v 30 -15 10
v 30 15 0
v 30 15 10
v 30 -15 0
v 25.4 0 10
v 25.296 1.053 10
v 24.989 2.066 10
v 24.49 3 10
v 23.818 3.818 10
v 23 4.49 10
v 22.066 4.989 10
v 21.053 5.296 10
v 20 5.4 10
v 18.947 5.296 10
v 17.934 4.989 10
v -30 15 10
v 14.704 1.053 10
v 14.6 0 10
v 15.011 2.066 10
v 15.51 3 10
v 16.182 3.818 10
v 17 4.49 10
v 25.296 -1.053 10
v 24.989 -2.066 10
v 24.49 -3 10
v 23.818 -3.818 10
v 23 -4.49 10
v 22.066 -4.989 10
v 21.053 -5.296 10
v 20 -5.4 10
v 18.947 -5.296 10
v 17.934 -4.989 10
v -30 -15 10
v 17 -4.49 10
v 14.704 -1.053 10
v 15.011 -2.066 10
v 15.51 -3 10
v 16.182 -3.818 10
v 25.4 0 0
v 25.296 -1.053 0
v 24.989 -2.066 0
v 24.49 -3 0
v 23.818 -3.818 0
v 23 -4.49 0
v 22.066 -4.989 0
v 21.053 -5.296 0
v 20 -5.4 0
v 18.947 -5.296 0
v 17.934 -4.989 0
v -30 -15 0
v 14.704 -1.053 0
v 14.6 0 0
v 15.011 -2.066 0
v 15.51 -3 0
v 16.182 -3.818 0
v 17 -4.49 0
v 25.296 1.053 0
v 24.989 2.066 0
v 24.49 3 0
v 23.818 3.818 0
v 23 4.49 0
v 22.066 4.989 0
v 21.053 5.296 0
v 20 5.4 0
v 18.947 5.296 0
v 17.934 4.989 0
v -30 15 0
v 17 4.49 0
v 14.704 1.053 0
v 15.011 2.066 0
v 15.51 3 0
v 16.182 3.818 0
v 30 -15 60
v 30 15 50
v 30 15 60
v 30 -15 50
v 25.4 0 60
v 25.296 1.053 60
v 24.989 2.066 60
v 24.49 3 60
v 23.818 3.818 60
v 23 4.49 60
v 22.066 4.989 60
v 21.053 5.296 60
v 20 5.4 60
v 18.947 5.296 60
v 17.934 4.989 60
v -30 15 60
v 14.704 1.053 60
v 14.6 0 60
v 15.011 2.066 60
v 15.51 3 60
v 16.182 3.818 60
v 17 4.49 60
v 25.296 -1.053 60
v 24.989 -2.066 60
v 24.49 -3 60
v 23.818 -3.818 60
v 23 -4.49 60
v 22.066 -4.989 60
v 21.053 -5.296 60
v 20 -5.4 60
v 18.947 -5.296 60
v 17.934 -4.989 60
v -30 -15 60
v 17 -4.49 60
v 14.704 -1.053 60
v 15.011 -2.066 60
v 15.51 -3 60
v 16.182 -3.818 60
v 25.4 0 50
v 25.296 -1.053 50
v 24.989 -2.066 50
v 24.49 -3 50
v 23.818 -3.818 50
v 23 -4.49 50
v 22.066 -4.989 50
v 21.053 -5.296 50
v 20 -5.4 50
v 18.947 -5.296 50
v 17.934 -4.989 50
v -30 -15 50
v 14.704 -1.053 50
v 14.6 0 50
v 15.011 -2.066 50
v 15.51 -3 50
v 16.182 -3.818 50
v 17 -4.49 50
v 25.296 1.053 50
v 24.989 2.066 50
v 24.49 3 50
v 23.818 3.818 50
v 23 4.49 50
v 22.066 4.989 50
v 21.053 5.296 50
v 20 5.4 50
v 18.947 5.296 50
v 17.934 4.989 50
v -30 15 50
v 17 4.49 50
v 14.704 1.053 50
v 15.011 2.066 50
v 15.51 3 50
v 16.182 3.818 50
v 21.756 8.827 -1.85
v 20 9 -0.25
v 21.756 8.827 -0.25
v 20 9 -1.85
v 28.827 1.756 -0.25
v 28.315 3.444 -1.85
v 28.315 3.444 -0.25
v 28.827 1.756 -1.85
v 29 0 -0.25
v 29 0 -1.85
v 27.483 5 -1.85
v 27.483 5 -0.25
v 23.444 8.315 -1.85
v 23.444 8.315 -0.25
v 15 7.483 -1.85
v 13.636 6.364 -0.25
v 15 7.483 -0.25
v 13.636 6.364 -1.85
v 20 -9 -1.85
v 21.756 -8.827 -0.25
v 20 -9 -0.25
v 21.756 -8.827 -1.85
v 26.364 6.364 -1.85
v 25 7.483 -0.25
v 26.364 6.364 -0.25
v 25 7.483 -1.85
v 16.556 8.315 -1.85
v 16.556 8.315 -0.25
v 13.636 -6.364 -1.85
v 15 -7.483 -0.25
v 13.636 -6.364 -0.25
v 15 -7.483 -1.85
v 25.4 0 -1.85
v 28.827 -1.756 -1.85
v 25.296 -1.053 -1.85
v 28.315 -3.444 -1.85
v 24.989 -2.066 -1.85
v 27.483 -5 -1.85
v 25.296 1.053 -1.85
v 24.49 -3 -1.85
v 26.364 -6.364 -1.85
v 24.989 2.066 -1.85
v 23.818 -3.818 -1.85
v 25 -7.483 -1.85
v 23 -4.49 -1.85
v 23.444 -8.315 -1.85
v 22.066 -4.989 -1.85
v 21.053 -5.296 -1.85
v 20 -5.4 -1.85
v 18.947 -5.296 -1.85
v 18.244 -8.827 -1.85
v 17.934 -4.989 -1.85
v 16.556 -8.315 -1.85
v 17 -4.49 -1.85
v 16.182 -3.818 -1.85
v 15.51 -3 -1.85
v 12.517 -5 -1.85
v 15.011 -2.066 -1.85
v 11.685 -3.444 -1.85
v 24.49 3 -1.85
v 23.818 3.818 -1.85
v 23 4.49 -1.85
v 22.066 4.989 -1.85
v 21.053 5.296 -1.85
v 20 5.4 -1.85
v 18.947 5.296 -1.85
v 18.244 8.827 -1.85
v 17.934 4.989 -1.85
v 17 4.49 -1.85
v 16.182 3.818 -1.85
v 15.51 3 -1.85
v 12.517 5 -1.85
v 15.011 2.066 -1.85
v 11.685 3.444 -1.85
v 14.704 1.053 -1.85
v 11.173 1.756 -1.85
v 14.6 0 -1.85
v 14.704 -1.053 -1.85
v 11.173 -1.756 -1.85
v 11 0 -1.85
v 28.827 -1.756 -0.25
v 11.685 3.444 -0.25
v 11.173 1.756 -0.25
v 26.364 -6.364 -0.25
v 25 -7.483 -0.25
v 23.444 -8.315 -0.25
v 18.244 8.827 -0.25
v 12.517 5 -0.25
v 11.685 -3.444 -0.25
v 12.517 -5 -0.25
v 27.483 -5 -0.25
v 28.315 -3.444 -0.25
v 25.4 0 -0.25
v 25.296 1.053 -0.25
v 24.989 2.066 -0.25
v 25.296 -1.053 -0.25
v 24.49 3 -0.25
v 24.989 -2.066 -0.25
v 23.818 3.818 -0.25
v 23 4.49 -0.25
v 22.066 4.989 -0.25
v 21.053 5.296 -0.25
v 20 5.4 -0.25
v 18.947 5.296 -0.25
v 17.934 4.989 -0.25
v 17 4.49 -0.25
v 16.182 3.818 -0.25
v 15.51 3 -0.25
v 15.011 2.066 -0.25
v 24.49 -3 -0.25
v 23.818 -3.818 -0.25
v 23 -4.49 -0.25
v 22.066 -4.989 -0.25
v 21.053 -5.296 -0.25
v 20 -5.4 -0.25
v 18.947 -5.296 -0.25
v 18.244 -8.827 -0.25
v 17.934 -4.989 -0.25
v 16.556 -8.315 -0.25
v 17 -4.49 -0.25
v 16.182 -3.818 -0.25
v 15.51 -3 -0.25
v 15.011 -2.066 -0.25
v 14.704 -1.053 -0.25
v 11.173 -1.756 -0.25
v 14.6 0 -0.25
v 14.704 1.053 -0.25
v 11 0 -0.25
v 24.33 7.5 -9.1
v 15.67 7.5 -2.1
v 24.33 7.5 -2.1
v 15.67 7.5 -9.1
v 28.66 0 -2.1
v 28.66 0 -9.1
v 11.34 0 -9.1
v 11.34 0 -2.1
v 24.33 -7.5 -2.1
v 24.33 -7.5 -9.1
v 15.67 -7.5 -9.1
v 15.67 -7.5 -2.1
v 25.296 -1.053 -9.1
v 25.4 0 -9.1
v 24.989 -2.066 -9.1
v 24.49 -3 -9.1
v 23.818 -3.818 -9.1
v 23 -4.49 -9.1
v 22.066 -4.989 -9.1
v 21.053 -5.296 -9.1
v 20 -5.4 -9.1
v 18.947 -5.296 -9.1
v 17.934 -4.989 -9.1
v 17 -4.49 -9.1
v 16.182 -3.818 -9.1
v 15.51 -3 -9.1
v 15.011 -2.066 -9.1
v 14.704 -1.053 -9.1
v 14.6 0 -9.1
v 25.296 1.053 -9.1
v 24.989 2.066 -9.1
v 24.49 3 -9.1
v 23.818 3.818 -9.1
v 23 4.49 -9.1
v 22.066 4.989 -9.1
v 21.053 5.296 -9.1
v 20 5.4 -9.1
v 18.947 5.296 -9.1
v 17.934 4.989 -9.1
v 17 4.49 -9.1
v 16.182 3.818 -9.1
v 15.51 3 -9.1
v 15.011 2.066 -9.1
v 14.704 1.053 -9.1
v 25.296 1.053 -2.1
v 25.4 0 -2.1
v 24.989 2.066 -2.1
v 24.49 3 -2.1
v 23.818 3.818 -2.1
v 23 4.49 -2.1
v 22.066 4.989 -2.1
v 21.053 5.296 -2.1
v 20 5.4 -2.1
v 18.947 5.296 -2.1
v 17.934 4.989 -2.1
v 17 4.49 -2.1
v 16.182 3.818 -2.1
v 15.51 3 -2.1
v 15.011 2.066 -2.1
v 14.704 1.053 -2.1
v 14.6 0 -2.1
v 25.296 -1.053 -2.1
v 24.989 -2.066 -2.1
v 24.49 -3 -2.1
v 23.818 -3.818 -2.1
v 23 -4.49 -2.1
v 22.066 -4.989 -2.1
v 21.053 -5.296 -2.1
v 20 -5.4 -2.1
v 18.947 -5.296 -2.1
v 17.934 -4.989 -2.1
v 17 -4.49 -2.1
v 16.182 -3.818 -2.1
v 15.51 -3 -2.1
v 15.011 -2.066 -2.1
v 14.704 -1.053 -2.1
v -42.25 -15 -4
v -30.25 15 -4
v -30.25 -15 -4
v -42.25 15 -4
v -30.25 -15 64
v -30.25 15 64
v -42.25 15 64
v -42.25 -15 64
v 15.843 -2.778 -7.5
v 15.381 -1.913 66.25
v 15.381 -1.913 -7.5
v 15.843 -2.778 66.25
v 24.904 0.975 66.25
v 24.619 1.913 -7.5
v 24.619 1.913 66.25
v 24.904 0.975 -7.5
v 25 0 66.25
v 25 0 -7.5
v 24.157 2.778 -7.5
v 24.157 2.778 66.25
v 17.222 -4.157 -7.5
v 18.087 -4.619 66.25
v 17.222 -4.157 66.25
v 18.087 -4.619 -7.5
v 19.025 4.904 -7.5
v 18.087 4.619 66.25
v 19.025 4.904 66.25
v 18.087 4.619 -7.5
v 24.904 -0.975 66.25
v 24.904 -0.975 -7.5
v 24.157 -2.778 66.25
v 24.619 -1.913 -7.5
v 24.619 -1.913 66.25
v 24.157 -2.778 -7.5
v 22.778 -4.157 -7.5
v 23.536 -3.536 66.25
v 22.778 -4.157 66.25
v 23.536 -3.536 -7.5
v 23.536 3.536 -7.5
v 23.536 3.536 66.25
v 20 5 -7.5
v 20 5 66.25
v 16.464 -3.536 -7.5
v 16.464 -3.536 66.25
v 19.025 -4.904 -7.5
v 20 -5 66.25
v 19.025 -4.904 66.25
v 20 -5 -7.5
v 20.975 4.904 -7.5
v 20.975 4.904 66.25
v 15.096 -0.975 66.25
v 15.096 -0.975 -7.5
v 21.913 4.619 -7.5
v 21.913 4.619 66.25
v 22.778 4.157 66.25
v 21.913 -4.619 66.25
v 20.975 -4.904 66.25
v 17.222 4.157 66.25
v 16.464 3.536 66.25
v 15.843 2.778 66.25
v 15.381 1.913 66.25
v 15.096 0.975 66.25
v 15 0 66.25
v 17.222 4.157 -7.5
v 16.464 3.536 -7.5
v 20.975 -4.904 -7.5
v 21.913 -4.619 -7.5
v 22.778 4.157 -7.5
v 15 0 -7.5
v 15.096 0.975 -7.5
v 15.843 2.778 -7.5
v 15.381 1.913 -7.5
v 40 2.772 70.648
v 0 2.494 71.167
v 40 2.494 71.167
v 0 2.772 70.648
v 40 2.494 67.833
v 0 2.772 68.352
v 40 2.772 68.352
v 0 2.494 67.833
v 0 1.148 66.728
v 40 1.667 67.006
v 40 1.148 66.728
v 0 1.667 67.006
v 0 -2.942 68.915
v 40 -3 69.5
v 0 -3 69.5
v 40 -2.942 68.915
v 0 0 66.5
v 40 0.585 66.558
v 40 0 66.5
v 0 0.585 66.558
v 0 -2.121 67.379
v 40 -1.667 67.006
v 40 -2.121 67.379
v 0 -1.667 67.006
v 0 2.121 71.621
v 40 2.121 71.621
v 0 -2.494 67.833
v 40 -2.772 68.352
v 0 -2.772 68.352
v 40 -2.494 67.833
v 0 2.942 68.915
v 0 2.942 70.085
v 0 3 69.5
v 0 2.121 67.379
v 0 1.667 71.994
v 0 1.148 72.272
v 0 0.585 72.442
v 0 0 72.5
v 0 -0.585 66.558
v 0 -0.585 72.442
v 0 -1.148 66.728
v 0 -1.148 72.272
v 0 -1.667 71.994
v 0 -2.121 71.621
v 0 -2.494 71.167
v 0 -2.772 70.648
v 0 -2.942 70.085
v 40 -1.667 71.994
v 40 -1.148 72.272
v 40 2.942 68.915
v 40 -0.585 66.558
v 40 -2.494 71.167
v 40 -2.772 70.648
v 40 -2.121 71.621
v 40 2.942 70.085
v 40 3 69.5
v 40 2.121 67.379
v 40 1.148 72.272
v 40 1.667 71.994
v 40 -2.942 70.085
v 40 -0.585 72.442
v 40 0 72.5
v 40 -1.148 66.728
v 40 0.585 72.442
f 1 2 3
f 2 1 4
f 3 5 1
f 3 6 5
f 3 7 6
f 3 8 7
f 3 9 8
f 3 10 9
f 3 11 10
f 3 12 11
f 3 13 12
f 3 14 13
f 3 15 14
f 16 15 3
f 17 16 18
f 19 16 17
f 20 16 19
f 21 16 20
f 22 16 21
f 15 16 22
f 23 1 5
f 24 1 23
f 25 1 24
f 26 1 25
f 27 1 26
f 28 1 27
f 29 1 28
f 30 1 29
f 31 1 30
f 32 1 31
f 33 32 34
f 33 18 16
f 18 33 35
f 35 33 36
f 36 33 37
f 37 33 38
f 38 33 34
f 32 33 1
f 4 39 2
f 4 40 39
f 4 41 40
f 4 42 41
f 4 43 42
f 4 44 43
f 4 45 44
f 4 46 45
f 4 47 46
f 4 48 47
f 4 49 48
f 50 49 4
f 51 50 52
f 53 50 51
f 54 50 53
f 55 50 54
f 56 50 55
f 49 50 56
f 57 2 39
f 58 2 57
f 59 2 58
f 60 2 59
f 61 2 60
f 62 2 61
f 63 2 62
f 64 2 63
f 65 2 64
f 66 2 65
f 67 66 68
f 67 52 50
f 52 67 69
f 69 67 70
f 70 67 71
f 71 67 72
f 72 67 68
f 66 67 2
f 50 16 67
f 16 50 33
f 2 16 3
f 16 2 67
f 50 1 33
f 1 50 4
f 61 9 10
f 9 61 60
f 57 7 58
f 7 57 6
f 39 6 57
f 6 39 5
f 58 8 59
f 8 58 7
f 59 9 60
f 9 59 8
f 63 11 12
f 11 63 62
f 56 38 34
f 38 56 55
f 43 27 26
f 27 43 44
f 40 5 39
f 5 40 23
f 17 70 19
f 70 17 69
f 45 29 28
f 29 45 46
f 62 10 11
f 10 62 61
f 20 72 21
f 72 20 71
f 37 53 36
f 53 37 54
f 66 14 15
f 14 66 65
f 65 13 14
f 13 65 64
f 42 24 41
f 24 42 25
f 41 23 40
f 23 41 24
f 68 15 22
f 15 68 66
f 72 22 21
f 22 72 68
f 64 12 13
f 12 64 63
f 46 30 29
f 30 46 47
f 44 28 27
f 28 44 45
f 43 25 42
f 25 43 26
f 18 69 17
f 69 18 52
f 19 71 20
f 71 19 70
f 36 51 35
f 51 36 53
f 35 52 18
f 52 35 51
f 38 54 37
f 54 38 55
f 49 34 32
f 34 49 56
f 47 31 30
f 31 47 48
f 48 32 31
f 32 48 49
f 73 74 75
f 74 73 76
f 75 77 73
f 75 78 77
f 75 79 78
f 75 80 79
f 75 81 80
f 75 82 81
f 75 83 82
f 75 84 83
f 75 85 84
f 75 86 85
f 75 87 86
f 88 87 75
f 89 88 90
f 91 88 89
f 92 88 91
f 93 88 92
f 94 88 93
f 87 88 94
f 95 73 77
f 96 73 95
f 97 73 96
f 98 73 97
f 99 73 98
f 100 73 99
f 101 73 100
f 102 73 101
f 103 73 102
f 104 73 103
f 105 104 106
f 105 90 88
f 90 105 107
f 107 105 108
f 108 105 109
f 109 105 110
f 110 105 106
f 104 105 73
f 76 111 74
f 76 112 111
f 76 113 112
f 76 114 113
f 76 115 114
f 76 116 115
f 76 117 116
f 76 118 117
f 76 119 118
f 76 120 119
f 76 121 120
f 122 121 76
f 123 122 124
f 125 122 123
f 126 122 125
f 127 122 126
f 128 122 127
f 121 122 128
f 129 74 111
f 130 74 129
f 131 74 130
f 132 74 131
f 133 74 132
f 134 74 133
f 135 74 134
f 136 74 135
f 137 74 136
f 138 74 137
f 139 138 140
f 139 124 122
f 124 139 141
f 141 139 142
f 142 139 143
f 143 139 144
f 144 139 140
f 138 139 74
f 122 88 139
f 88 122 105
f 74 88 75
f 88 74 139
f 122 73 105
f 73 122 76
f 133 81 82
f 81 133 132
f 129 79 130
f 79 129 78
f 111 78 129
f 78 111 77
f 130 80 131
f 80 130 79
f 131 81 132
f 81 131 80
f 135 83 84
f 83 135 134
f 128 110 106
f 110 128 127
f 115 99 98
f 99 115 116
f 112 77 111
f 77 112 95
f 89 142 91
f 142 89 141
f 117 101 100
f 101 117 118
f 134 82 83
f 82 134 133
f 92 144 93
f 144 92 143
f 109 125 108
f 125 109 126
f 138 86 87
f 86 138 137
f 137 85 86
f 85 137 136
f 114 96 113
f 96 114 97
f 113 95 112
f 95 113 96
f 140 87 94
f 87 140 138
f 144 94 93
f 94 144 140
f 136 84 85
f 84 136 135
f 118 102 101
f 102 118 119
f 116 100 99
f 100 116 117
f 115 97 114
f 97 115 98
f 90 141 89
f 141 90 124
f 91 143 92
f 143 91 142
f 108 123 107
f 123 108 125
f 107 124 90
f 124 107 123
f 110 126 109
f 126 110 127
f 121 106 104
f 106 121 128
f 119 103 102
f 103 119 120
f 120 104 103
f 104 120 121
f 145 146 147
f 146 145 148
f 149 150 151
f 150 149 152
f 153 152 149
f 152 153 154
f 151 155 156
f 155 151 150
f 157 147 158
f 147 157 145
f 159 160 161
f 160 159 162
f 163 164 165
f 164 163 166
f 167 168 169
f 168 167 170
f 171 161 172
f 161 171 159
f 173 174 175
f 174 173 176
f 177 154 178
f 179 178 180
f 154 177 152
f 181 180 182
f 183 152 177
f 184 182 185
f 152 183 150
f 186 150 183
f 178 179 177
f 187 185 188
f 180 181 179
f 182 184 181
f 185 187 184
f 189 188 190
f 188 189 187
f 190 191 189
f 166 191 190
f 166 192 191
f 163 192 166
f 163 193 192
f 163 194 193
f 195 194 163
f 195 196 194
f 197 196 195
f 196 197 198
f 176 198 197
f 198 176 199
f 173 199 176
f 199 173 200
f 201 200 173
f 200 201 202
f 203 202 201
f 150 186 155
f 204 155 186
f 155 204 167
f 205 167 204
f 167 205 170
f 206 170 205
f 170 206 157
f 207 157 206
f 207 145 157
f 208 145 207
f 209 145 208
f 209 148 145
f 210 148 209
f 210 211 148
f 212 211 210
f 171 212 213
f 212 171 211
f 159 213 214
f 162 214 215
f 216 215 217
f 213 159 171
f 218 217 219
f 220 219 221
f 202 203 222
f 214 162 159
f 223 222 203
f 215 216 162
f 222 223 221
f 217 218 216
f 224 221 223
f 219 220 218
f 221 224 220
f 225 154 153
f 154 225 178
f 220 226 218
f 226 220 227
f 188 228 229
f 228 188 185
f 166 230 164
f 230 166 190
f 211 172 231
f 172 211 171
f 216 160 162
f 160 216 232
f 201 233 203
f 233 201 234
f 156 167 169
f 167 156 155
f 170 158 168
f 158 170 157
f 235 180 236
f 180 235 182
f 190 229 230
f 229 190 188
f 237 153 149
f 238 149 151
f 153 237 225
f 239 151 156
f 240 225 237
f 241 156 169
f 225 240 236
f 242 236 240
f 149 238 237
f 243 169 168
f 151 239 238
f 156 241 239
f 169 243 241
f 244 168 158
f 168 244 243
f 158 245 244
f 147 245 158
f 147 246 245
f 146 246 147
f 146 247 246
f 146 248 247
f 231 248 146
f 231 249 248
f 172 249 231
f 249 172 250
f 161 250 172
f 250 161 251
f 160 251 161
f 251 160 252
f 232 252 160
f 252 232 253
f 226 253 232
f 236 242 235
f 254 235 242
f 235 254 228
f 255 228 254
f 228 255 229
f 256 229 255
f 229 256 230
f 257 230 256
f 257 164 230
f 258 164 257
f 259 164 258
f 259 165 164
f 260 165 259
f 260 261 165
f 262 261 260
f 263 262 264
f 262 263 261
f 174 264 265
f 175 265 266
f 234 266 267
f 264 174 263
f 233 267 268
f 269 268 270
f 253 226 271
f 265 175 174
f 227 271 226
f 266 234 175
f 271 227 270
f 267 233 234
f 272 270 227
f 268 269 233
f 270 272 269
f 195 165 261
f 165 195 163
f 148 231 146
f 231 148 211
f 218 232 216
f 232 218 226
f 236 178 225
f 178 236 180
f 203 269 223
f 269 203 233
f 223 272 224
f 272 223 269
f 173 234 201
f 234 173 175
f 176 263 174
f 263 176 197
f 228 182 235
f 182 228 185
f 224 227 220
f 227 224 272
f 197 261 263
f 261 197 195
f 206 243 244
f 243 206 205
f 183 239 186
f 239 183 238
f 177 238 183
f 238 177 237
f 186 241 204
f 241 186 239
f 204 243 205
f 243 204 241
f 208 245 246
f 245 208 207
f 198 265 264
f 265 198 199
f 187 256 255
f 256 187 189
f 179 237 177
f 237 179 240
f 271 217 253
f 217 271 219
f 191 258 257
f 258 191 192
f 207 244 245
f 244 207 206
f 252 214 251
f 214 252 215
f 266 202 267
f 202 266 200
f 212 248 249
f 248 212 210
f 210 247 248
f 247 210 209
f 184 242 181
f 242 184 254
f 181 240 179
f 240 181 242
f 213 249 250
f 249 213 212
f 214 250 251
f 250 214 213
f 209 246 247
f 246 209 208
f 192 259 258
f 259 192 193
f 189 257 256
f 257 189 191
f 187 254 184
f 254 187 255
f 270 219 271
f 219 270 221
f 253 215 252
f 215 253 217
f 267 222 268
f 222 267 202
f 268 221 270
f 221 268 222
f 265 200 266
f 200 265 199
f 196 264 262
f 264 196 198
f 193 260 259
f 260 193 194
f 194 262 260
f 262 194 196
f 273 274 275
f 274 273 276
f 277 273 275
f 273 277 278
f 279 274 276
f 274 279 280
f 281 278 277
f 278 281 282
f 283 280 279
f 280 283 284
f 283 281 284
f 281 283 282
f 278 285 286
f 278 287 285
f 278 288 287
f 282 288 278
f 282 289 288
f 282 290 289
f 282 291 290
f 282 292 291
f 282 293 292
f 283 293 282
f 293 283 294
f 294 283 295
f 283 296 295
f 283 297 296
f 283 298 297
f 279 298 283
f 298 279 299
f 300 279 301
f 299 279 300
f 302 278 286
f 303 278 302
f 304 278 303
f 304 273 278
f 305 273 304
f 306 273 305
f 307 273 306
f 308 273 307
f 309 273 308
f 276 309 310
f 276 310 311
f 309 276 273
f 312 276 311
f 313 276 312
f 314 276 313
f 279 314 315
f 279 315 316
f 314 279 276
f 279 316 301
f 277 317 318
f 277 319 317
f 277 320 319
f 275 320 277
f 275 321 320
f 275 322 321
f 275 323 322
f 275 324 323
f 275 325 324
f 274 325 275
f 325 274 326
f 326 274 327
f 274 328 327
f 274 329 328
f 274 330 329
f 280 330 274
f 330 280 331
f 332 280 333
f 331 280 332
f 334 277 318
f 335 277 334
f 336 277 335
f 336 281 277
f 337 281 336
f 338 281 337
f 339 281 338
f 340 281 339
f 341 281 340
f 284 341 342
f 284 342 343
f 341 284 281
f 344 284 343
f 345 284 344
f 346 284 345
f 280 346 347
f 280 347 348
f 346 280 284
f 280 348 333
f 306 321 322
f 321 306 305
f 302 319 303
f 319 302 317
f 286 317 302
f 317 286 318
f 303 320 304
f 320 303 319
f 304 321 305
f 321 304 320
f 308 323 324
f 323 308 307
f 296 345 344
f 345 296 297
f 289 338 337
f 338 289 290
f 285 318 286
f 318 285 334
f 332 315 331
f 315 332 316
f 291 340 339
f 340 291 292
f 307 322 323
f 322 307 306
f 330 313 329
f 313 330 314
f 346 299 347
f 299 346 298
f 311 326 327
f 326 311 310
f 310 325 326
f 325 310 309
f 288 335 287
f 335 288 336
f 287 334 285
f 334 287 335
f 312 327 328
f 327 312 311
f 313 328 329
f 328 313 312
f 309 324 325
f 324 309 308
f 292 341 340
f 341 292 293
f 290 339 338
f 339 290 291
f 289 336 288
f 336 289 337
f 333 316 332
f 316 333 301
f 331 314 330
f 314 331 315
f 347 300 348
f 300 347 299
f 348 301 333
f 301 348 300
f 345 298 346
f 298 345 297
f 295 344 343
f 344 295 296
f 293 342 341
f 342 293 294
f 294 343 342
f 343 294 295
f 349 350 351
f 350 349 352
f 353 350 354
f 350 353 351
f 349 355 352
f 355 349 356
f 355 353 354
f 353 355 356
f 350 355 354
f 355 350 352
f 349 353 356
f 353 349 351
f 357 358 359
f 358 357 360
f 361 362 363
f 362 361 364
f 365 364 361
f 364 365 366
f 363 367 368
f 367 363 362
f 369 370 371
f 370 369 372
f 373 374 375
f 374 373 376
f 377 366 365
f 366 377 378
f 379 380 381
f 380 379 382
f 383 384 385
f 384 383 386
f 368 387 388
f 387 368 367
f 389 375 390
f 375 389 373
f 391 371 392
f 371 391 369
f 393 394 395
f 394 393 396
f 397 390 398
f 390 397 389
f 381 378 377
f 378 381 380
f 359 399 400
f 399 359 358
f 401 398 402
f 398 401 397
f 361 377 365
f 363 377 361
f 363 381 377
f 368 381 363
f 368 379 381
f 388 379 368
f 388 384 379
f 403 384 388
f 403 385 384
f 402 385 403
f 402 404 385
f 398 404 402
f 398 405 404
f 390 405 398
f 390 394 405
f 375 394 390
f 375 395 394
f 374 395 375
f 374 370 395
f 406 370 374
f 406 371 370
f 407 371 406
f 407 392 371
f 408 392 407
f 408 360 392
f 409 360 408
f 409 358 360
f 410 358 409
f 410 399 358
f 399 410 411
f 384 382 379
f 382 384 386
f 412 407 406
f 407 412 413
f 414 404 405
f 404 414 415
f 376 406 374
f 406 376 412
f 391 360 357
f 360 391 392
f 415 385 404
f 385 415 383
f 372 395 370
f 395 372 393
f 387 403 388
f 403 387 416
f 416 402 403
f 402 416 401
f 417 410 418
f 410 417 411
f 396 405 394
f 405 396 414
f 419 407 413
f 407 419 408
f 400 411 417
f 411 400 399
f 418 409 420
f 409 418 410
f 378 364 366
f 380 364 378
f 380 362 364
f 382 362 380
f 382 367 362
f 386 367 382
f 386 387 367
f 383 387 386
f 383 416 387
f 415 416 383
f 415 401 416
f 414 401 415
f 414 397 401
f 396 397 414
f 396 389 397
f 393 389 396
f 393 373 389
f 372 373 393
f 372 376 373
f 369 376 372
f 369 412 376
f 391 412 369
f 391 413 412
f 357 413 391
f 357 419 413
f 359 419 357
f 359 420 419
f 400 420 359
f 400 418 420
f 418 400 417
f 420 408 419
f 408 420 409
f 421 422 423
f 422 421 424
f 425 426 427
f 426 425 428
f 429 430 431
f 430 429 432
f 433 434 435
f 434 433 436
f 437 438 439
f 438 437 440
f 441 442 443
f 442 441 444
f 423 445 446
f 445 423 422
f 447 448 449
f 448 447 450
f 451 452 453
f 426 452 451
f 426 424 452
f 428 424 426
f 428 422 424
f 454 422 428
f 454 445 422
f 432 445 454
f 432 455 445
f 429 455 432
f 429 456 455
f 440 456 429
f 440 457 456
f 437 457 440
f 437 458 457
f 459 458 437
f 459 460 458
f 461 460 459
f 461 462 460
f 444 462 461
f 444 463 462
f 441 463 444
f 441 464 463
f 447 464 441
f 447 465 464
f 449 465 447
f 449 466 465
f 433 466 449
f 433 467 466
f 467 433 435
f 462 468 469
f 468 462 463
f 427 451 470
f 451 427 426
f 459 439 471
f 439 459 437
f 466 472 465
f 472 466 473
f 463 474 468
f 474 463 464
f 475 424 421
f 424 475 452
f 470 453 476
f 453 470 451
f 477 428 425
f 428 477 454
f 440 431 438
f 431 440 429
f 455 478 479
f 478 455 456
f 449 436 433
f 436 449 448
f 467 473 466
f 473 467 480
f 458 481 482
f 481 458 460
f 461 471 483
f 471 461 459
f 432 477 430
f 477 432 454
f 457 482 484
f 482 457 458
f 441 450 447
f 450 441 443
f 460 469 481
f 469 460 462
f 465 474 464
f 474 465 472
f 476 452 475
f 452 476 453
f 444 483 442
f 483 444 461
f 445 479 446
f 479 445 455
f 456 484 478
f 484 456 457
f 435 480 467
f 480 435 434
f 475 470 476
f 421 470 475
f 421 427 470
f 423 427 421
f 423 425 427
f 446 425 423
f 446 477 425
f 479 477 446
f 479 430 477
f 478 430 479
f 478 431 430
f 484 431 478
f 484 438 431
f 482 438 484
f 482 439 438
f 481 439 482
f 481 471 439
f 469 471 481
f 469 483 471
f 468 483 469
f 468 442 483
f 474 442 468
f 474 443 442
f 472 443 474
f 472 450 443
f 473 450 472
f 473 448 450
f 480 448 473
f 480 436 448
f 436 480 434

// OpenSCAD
$fn = 32;

// ------------------------------------------------------------------------
// C clamp: throat 50 mm, screw d10
// Every part is its own module, assembly() places every instance.
// ------------------------------------------------------------------------

// --- part 1 ---
module clamp_arm() {
  difference() {
    translate([-30, -15, 0]) cube([60, 30, 10]);
    translate([20, 0, -1]) cylinder(h = 12, d = 10.8);
  }
}

// --- part 2 ---
module clamp_spine() {
  difference() {
    translate([-34, -15, 0]) cube([68, 30, 12]);
  }
}

// --- part 3 ---
module clamp_screw() {
  translate([0, 0, -36.875]) cylinder(h = 73.75, d = 10);
}

// --- part 4 ---
module clamp_washer() {
  difference() {
      translate([0, 0, 0]) cylinder(h = 1.6, d = 18);
      translate([0, 0, -1]) cylinder(h = 3.6, d = 10.8);
    }
}

// --- part 5 ---
module clamp_nut() {
  difference() {
    linear_extrude(height = 7) polygon(points = [[8.66, 0], [4.33, 7.5], [-4.33, 7.5], [-8.66, 0], [-4.33, -7.5], [4.33, -7.5]]);
    translate([0, 0, -1]) cylinder(h = 9, d = 10.8);
  }
}

// --- part 6 ---
module tommy_bar() {
  translate([0, 0, -20]) cylinder(h = 40, d = 6);
}

// --- assembly ---
module assembly() {
  color([0.80, 0.24, 0.20]) translate([0, 0, 0]) rotate([0, 0, 0]) clamp_arm();
  color([0.20, 0.45, 0.75]) translate([0, 0, 50]) rotate([0, 0, 0]) clamp_arm();
  color([0.25, 0.62, 0.32]) translate([-42.25, 0, 30]) rotate([0, 90, 0]) clamp_spine();
  color([0.92, 0.70, 0.18]) translate([20, 0, 29.375]) rotate([0, 0, 0]) clamp_screw();
  color([0.58, 0.35, 0.70]) translate([20, 0, -1.85]) rotate([0, 0, 0]) clamp_washer();
  color([0.16, 0.66, 0.66]) translate([20, 0, -9.1]) rotate([0, 0, 0]) clamp_nut();
  color([0.85, 0.48, 0.18]) translate([20, 0, 69.5]) rotate([0, 90, 0]) tommy_bar();
}

assembly();
